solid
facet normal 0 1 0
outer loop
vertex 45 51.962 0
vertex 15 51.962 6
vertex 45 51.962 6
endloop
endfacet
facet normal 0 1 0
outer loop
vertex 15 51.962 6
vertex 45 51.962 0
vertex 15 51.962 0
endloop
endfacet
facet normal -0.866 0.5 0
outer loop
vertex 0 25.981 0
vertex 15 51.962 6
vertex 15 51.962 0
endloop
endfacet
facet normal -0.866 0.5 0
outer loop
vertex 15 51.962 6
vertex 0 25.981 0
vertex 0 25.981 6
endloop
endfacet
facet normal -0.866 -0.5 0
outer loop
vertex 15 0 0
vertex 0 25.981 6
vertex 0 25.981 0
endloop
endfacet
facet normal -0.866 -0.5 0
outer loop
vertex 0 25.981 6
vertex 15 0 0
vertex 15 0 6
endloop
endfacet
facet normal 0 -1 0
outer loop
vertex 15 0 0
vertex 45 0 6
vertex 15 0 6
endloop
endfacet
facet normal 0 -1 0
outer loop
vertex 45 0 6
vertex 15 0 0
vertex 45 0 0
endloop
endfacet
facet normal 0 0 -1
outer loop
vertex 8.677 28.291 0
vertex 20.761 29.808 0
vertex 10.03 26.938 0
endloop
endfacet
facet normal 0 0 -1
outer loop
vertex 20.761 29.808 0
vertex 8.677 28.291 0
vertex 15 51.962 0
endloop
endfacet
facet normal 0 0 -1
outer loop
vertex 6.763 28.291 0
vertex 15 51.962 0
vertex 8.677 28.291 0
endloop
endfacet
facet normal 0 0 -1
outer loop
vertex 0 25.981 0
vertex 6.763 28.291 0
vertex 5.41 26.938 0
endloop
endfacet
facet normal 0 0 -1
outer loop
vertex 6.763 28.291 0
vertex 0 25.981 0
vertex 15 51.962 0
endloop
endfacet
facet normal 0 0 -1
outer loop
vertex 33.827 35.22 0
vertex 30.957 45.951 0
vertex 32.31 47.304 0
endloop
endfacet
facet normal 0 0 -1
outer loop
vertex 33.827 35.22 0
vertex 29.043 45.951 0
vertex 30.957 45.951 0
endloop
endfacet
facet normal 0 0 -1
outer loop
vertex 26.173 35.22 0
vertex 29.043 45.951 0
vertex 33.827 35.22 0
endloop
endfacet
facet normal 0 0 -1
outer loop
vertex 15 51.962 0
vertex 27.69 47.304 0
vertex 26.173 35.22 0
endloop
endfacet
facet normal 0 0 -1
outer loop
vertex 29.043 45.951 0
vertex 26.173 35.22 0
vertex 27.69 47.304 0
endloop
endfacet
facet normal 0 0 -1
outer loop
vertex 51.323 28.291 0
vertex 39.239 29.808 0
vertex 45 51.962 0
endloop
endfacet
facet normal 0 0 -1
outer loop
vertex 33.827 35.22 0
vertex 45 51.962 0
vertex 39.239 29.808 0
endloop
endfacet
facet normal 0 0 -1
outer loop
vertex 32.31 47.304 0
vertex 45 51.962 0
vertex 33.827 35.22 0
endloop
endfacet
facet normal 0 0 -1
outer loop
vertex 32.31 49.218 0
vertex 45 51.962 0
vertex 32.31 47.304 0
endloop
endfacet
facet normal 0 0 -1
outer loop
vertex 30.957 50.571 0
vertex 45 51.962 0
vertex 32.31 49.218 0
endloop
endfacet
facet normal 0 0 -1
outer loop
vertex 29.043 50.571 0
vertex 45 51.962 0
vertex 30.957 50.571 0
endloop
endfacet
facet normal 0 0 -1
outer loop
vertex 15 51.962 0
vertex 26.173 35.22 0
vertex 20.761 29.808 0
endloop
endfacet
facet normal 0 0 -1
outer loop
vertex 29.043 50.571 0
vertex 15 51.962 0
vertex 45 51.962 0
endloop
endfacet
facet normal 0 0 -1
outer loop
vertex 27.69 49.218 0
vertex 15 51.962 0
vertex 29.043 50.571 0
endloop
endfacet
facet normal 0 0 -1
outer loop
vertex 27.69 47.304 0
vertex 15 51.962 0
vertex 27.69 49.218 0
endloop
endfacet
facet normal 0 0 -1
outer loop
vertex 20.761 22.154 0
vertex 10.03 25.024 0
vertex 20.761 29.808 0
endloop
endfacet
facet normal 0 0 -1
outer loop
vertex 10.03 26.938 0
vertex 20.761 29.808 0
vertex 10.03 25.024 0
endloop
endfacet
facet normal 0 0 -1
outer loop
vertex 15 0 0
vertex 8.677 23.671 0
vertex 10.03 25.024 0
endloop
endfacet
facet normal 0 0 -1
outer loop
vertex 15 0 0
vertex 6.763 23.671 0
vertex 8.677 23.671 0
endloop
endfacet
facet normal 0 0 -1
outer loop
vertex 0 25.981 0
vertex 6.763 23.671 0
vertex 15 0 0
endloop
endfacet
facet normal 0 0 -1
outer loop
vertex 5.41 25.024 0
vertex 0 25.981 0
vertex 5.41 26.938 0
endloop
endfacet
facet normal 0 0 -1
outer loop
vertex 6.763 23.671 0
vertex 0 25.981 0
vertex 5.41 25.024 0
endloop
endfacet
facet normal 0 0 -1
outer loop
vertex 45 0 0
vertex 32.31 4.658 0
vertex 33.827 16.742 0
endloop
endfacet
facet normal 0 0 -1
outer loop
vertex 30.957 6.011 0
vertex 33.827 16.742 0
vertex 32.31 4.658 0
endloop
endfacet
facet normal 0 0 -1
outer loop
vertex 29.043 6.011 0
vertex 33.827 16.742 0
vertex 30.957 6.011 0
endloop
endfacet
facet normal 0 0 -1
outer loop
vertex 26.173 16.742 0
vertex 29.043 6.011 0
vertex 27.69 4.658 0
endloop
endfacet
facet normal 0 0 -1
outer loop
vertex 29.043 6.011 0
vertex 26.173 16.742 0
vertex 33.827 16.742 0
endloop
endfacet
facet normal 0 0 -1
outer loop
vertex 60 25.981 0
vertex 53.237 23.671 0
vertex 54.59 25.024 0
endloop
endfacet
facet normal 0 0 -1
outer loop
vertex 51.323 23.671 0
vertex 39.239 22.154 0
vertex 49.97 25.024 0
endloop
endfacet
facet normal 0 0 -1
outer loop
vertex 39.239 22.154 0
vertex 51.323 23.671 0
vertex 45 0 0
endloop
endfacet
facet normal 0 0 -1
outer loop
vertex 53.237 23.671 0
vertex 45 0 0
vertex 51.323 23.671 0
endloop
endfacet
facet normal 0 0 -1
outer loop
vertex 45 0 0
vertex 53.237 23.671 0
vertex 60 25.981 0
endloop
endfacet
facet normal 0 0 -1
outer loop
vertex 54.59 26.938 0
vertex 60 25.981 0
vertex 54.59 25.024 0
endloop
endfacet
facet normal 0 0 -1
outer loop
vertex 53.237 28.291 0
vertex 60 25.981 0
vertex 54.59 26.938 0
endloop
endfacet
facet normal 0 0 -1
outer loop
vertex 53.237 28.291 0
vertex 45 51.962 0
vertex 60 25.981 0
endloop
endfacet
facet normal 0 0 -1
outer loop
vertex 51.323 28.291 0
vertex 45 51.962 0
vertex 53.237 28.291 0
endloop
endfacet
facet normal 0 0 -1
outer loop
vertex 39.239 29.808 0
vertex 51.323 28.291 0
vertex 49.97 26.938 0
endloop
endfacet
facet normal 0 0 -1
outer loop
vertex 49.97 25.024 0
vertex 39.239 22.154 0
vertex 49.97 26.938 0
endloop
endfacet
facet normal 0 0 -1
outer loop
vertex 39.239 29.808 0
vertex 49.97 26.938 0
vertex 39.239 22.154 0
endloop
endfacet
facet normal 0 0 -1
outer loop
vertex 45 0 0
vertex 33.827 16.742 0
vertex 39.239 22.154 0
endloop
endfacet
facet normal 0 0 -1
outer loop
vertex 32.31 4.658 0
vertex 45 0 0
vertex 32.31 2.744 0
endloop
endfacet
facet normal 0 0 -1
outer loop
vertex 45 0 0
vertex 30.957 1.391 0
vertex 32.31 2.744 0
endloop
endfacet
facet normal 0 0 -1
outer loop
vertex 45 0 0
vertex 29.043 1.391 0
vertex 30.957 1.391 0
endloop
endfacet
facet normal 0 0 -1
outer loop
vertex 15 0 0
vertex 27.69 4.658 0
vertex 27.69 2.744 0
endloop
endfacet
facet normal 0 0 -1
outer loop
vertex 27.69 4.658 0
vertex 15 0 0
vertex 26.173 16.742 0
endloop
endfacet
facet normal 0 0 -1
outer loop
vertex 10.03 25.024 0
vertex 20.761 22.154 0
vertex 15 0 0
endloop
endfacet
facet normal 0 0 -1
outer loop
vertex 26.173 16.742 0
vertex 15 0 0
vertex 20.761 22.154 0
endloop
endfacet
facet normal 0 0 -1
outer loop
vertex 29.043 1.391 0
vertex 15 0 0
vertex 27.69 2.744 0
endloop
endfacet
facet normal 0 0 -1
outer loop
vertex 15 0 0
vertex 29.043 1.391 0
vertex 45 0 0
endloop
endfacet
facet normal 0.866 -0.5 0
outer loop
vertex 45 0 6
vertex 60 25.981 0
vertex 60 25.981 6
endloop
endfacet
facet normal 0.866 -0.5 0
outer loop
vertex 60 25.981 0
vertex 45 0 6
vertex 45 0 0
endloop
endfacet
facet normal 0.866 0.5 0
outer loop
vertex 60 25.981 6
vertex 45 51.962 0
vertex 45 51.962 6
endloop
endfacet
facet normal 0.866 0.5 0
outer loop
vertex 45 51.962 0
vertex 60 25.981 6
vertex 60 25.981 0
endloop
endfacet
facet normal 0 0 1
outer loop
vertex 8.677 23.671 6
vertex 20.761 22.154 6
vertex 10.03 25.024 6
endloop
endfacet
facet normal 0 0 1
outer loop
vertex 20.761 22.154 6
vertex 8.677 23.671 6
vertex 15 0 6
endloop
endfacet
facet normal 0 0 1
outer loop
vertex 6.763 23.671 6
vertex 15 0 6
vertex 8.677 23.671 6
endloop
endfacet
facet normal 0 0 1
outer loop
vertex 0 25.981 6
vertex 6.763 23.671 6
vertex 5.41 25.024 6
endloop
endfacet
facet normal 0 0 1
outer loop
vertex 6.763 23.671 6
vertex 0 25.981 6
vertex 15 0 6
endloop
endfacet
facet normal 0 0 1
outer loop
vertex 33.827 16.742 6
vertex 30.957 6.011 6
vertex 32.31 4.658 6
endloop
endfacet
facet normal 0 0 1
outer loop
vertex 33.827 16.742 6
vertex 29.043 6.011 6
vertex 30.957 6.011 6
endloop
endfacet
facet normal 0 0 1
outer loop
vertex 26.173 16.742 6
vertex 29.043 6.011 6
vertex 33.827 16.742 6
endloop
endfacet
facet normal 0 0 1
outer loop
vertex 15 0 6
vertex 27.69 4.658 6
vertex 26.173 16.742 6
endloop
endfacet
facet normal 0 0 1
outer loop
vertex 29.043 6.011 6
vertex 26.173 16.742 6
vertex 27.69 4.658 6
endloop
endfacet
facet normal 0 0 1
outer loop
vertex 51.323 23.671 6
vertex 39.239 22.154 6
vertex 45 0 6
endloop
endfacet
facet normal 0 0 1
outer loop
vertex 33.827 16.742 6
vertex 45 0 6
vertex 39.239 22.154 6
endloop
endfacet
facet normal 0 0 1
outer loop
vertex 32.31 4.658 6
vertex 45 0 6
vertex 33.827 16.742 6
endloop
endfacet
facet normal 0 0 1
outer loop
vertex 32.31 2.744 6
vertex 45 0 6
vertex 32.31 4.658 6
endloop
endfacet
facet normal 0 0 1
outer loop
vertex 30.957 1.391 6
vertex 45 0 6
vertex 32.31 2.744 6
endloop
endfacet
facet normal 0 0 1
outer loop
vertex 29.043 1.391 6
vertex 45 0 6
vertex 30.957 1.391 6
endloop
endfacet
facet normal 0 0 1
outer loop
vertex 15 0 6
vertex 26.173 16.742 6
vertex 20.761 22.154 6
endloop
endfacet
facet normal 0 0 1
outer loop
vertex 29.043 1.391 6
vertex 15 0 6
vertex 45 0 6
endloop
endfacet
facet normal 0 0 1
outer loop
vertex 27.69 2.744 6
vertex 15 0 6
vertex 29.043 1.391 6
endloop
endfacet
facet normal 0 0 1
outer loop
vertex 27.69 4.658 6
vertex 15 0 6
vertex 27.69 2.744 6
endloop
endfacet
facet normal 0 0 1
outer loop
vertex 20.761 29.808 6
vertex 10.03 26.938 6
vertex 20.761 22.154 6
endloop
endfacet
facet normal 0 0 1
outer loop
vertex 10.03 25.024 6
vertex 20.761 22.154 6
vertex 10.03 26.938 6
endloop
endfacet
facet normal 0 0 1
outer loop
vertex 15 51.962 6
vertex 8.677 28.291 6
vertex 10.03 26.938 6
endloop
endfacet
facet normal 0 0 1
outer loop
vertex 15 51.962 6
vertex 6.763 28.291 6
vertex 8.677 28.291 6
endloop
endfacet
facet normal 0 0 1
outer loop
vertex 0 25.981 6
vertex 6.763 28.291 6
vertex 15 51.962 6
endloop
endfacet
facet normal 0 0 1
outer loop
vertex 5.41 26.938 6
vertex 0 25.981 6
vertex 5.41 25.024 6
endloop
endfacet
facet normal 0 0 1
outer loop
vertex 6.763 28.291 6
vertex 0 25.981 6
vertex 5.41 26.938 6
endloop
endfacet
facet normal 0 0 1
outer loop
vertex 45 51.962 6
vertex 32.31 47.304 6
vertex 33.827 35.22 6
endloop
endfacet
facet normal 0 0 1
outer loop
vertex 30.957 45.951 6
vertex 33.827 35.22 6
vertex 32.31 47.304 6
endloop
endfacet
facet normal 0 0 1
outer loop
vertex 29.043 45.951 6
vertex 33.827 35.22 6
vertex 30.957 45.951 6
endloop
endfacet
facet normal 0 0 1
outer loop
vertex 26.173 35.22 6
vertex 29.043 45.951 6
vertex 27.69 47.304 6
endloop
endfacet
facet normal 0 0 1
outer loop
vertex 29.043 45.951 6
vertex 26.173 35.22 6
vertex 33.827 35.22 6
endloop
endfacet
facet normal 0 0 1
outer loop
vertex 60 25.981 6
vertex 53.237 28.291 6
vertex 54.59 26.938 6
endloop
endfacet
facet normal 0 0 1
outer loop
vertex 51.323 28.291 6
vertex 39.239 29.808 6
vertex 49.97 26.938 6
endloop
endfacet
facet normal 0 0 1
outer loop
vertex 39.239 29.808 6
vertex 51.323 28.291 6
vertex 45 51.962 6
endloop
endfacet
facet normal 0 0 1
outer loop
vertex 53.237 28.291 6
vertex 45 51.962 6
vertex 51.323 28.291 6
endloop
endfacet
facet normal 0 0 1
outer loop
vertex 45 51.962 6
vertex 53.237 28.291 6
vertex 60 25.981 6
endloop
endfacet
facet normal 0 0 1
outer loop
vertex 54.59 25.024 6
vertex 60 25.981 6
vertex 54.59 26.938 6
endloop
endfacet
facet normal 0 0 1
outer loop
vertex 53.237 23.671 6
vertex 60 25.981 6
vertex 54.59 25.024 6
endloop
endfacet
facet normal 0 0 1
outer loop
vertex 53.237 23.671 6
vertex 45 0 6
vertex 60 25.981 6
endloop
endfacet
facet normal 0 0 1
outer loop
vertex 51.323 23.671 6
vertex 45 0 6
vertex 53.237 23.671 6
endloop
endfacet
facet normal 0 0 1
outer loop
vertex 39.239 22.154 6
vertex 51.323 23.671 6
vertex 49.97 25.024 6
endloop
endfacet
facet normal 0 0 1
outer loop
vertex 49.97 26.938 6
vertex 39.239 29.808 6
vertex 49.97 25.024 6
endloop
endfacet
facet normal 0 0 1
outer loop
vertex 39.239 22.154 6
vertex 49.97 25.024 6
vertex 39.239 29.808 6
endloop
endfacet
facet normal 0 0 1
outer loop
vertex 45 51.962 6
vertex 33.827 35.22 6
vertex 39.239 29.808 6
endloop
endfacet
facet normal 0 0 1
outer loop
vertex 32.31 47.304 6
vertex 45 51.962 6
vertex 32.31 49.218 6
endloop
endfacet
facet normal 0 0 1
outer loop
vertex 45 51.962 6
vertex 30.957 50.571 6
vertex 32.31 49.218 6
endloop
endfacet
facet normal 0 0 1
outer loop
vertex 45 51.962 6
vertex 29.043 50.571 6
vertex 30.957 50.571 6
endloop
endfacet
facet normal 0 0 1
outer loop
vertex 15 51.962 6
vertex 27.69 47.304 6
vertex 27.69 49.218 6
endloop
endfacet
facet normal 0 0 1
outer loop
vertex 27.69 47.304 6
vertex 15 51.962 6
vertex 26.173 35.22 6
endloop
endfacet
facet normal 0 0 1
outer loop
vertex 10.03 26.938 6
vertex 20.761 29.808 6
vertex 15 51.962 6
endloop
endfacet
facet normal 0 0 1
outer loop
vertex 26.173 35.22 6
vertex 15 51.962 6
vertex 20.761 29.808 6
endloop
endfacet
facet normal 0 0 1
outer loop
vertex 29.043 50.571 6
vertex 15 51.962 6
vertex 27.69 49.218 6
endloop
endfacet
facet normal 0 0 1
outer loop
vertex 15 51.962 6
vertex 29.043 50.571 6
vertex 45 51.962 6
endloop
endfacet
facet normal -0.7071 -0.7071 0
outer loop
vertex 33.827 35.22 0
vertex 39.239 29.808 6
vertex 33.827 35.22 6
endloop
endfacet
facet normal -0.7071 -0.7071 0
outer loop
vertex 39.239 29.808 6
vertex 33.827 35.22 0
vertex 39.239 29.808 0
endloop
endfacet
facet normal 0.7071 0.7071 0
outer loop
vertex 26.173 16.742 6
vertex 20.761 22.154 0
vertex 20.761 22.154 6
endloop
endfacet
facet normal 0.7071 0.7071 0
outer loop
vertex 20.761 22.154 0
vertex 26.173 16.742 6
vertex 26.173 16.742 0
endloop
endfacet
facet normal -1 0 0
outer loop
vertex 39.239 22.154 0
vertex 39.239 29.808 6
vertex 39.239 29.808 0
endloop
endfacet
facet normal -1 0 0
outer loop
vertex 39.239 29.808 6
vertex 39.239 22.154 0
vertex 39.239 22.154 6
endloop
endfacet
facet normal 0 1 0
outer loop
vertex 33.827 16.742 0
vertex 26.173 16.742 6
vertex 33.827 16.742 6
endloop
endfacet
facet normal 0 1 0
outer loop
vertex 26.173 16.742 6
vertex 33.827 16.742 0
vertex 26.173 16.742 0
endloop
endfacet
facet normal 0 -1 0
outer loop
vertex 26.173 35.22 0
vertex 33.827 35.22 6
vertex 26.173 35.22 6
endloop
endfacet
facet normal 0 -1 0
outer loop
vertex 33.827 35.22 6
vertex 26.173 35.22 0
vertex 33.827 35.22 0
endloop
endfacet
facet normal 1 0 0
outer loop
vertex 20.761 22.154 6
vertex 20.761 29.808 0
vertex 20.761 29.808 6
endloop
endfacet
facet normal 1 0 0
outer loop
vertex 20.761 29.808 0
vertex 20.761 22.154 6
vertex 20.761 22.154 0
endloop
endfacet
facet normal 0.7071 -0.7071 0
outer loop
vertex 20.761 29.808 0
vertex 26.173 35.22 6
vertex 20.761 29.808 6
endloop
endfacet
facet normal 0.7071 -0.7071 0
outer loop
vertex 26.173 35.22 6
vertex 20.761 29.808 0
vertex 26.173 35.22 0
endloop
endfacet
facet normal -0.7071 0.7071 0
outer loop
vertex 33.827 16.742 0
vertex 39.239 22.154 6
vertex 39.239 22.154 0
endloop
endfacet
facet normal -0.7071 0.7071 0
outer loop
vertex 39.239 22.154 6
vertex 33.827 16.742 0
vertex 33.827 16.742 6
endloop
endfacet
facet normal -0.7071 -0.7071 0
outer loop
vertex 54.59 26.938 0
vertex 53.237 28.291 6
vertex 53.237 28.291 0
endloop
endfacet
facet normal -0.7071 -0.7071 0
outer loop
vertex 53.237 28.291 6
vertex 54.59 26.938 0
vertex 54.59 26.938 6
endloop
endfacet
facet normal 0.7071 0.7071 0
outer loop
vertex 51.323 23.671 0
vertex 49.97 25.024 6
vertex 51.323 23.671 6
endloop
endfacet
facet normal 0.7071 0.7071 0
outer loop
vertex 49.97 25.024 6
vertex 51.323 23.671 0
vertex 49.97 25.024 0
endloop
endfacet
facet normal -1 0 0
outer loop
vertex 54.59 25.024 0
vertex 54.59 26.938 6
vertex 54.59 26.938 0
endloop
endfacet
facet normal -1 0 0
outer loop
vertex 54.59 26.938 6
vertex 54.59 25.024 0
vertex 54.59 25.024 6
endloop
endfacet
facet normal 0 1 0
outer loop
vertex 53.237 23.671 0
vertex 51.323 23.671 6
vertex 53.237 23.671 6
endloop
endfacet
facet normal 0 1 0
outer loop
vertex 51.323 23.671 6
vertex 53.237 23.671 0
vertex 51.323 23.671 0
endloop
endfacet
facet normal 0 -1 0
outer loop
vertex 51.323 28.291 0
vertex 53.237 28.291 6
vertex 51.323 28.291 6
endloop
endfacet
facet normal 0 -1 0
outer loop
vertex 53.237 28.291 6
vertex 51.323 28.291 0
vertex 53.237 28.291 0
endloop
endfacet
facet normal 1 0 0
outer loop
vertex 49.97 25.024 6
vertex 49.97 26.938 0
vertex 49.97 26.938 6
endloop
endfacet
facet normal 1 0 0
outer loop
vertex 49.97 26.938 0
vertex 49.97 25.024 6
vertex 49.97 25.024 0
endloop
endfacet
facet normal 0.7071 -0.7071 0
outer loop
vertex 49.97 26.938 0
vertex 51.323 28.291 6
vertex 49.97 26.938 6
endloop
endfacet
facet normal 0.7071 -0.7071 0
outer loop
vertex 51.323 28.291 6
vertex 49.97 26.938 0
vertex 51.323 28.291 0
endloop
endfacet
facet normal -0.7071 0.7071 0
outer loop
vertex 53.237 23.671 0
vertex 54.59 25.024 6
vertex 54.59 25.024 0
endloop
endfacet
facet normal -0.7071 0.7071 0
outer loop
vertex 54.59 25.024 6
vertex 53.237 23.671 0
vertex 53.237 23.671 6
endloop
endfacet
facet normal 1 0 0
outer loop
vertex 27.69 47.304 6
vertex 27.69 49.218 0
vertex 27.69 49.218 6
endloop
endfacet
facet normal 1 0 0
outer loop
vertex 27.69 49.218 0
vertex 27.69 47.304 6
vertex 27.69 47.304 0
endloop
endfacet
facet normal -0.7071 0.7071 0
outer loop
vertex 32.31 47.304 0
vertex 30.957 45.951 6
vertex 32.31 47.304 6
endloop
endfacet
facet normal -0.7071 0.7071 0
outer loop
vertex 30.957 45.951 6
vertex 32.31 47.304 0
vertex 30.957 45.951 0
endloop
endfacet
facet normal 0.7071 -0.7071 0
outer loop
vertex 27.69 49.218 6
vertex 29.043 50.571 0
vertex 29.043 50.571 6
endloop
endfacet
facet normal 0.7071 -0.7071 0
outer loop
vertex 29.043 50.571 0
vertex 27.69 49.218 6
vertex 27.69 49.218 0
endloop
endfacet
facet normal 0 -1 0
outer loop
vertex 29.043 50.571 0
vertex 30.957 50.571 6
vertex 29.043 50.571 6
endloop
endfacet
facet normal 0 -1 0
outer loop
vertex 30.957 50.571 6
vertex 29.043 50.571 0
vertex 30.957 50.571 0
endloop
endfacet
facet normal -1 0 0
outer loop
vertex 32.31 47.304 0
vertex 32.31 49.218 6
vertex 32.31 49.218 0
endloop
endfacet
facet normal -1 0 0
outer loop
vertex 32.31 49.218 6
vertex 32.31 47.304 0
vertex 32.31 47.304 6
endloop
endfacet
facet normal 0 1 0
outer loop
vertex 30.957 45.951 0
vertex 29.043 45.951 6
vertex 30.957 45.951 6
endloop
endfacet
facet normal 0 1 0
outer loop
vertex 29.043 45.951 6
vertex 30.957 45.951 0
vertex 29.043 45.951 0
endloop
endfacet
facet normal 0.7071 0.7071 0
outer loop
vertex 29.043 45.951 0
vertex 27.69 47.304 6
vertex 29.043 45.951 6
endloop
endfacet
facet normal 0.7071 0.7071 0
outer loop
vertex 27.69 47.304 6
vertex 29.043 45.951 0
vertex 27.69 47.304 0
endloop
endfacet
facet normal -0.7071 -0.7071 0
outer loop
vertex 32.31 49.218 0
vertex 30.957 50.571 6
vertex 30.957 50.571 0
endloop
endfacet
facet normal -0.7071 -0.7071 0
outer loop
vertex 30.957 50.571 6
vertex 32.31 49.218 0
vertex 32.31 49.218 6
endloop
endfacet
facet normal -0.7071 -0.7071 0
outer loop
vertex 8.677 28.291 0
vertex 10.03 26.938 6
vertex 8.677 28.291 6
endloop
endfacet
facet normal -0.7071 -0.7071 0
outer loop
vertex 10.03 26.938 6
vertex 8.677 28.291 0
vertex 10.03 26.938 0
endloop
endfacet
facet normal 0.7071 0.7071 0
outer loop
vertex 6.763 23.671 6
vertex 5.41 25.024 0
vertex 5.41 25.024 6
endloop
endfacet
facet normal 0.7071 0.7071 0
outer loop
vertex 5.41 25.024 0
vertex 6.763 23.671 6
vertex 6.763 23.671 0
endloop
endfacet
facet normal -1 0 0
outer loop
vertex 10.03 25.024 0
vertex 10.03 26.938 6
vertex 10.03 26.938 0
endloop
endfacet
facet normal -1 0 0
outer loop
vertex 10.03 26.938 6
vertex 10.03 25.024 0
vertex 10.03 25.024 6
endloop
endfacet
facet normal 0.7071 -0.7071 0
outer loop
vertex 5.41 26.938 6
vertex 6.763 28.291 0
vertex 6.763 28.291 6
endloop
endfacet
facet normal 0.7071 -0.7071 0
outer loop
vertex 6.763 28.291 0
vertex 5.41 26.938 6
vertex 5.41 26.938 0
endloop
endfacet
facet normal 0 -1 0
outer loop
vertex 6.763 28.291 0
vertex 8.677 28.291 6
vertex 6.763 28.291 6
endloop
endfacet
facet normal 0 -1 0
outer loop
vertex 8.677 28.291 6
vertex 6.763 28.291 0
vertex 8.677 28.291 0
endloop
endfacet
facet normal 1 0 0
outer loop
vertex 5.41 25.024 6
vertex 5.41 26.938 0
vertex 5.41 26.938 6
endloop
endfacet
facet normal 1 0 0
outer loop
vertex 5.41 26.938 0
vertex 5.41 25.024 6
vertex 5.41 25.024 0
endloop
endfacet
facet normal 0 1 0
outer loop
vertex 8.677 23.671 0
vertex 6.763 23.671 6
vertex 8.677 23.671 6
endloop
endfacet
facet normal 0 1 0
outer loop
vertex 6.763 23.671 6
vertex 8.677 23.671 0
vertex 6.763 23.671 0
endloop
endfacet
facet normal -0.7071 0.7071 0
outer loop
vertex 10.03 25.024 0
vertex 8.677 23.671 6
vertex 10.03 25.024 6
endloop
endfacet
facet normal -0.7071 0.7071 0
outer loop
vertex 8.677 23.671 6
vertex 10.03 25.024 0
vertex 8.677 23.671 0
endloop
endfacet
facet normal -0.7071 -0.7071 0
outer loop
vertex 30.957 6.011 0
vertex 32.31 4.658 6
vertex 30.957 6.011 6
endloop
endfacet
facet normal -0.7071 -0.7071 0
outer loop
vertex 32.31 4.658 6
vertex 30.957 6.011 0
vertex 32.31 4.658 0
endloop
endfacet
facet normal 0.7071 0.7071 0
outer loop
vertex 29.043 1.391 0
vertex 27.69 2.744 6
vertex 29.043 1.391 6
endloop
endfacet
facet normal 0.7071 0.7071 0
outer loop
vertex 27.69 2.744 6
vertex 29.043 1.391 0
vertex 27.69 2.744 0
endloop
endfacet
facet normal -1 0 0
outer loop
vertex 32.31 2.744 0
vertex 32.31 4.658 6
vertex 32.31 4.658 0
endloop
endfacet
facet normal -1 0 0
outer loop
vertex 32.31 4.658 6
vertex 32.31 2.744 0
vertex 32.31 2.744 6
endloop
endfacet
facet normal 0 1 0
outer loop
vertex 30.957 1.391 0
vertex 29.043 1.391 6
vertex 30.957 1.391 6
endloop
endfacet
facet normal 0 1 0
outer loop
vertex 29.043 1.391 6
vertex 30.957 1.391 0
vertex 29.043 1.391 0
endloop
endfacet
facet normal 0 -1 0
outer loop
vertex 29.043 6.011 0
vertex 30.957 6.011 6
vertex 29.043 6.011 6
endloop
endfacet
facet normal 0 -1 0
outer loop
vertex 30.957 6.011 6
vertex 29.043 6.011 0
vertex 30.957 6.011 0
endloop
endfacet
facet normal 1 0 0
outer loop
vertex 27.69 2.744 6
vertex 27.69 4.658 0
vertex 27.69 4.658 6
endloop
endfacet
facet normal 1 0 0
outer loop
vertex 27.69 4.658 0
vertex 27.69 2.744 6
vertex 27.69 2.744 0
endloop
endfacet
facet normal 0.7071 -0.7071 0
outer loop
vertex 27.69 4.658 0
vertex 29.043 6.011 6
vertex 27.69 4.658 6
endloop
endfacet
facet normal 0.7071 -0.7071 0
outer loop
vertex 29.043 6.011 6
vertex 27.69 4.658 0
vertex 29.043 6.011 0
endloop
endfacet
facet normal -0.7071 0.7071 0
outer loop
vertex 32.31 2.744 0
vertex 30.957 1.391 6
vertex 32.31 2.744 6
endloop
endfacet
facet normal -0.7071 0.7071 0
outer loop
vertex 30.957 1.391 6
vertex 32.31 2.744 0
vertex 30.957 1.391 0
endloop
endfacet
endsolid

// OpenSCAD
$fn = 32;

// ----------------------------------------------------------------------
// Polygon plate: 6-gon R30, 4 bolt windows
// ----------------------------------------------------------------------

// --- parameters (mm) ---
sides = 6;                // number of polygon sides
plate_r = 30;             // circumscribed radius of the polygon
bore_r = 10;              // centre bore radius
bolts = 4;                // number of bolt windows
ring_r = 22.28;           // bolt-circle radius
bolt_r = 2.5;             // bolt window radius
plate_t = 6;              // plate thickness, Z (extrusion height)

plate_d = 2 * plate_r;  // circumscribed diameter
bore_d = 2 * bore_r;  // centre bore diameter
bolt_d = 2 * bolt_r;  // bolt window diameter
ring_d = 2 * ring_r;  // bolt-circle diameter

profile = [[60, 25.981], [45, 51.962], [15, 51.962], [0, 25.981], [15, 0], [45, 0]];  // primary outline, 6 points, counter clockwise
void_1 = [[39.239, 29.808], [33.827, 35.22], [26.173, 35.22], [20.761, 29.808], [20.761, 22.154], [26.173, 16.742], [33.827, 16.742], [39.239, 22.154]];  // centre bore, 8 points
void_2 = [[54.59, 26.938], [53.237, 28.291], [51.323, 28.291], [49.97, 26.938], [49.97, 25.024], [51.323, 23.671], [53.237, 23.671], [54.59, 25.024]];  // bolt window 1, 8 points
void_3 = [[32.31, 49.218], [30.957, 50.571], [29.043, 50.571], [27.69, 49.218], [27.69, 47.304], [29.043, 45.951], [30.957, 45.951], [32.31, 47.304]];  // bolt window 2, 8 points
void_4 = [[10.03, 26.938], [8.677, 28.291], [6.763, 28.291], [5.41, 26.938], [5.41, 25.024], [6.763, 23.671], [8.677, 23.671], [10.03, 25.024]];  // bolt window 3, 8 points
void_5 = [[32.31, 4.658], [30.957, 6.011], [29.043, 6.011], [27.69, 4.658], [27.69, 2.744], [29.043, 1.391], [30.957, 1.391], [32.31, 2.744]];  // bolt window 4, 8 points

// --- the one profile operation ---
difference() {
  linear_extrude(height = plate_t) polygon(points = profile);
  translate([0, 0, -1])
    linear_extrude(height = plate_t + 2) polygon(points = void_1);
  translate([0, 0, -1])
    linear_extrude(height = plate_t + 2) polygon(points = void_2);
  translate([0, 0, -1])
    linear_extrude(height = plate_t + 2) polygon(points = void_3);
  translate([0, 0, -1])
    linear_extrude(height = plate_t + 2) polygon(points = void_4);
  translate([0, 0, -1])
    linear_extrude(height = plate_t + 2) polygon(points = void_5);
}
